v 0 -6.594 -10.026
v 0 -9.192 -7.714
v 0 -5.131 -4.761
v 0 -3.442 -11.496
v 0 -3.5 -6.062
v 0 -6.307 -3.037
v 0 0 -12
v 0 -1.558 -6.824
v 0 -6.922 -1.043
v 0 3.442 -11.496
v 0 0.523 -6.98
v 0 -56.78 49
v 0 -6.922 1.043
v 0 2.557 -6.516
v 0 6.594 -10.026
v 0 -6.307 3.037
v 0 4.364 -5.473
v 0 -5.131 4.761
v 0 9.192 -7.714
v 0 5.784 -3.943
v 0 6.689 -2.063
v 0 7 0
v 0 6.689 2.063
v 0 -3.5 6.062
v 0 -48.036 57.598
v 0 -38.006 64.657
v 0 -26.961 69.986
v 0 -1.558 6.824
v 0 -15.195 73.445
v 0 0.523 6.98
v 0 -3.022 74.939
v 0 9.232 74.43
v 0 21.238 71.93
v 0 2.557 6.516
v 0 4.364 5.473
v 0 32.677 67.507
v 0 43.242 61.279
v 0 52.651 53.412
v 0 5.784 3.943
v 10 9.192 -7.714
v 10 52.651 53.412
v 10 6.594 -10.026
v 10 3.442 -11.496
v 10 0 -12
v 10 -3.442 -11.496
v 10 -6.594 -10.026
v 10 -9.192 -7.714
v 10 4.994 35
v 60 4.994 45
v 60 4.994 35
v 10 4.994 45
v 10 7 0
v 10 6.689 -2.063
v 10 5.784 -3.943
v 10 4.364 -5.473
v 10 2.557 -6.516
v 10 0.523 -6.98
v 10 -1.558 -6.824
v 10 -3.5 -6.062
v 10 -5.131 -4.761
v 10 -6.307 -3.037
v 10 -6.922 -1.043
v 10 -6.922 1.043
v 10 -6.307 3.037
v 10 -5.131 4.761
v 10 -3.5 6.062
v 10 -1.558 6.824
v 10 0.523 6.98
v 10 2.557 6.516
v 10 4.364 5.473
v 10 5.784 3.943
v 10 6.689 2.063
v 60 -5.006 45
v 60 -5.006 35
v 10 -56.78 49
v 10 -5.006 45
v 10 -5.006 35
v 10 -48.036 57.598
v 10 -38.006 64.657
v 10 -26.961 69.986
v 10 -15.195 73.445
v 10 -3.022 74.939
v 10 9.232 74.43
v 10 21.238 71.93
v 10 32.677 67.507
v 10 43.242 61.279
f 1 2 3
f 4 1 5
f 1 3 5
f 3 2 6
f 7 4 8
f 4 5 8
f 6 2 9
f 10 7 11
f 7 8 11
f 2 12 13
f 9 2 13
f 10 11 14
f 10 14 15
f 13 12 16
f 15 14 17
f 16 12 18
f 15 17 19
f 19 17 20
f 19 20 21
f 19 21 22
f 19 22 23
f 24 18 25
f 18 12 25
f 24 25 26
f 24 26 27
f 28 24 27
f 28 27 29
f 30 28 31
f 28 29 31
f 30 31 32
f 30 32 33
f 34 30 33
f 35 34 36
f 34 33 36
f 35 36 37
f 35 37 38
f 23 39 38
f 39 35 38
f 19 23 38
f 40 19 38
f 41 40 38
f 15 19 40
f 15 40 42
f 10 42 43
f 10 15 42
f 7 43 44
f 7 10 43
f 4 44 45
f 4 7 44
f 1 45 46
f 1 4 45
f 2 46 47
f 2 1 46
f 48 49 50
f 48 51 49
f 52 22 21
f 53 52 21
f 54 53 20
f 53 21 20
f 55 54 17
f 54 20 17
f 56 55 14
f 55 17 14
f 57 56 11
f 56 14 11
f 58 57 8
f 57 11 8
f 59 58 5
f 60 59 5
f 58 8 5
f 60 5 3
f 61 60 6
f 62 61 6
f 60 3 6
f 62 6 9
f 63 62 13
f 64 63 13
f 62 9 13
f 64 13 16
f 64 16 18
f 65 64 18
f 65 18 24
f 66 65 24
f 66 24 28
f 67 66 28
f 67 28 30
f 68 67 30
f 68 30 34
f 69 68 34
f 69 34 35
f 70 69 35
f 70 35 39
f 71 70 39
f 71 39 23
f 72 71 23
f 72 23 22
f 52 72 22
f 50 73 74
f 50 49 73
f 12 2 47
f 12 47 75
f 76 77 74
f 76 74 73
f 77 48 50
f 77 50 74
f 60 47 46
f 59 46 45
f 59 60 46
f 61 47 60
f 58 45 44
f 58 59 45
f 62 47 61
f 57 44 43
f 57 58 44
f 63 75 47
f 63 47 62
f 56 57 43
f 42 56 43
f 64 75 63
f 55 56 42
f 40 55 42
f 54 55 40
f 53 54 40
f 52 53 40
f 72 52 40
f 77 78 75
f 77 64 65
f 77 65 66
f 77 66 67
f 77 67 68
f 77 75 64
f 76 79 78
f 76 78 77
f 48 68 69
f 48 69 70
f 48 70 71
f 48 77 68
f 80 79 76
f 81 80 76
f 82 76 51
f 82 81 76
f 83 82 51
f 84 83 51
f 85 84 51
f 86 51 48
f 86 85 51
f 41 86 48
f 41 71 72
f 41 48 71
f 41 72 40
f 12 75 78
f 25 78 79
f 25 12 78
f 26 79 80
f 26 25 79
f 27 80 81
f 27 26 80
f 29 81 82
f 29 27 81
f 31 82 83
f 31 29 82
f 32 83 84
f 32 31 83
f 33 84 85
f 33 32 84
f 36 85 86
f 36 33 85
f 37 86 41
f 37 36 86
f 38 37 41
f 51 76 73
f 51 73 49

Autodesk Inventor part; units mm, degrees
ref_plane "YZ Plane" through (0, 0, 0) normal (1, 0, 0) x (0, 1, 0)
ref_plane "XZ Plane" through (0, 0, 0) normal (0, 1, 0) x (-1, 0, 0)
ref_plane "XY Plane" through (0, 0, 0) normal (0, 0, 1) x (1, 0, 0)
sketch "Sketch1" plane through (0, 0, 0) normal (1, 0, 0) x (0, 1, 0)
  arc A0 (52.6508, 53.4125) -> (-56.7805, 48.9997) centre (0, 0) ccw
  circle A1 centre (0, 0) radius 7
  arc A2 (-9.1925, -7.7135) -> (9.1925, -7.7135) centre (0, 0) ccw
  line L0 (-9.1925, -7.7135) -> (-56.7805, 48.9997)
  line L1 (0, -37.4043) -> (0, 140.4256) projected
  line L2 (9.1925, -7.7135) -> (52.6508, 53.4125)
  point P0 (-112.1792, 115.0213)
  point P1 (112.1792, 115.0213)
  dimension "d0" = 150
  dimension "d1" = 14
  dimension "d2" = 5
  dimension "d3" = 40
extrude "Extrusion1" add sketch "Sketch1" along normal blind 10 contours L2 A2 L1 A1 A0 | L1 A1 A2 L0 A0
sketch "Sketch2" plane through (10, 0, 0) normal (1, 0, 0) x (0, 0, -1)
  line L0 (-35, -5.0063) -> (-45, -5.0063)
  line L1 (-45, -5.0063) -> (-45, 4.9937)
  line L2 (-45, 4.9937) -> (-35, 4.9937)
  line L3 (-35, 4.9937) -> (-35, -5.0063)
  point P0 (0, 0)
  dimension "d6" = 10
  dimension "d7" = 10
  dimension "d10" = 35
extrude "Extrusion2" add sketch "Sketch2" along normal blind 50
properties part number "pitch gear v2"
